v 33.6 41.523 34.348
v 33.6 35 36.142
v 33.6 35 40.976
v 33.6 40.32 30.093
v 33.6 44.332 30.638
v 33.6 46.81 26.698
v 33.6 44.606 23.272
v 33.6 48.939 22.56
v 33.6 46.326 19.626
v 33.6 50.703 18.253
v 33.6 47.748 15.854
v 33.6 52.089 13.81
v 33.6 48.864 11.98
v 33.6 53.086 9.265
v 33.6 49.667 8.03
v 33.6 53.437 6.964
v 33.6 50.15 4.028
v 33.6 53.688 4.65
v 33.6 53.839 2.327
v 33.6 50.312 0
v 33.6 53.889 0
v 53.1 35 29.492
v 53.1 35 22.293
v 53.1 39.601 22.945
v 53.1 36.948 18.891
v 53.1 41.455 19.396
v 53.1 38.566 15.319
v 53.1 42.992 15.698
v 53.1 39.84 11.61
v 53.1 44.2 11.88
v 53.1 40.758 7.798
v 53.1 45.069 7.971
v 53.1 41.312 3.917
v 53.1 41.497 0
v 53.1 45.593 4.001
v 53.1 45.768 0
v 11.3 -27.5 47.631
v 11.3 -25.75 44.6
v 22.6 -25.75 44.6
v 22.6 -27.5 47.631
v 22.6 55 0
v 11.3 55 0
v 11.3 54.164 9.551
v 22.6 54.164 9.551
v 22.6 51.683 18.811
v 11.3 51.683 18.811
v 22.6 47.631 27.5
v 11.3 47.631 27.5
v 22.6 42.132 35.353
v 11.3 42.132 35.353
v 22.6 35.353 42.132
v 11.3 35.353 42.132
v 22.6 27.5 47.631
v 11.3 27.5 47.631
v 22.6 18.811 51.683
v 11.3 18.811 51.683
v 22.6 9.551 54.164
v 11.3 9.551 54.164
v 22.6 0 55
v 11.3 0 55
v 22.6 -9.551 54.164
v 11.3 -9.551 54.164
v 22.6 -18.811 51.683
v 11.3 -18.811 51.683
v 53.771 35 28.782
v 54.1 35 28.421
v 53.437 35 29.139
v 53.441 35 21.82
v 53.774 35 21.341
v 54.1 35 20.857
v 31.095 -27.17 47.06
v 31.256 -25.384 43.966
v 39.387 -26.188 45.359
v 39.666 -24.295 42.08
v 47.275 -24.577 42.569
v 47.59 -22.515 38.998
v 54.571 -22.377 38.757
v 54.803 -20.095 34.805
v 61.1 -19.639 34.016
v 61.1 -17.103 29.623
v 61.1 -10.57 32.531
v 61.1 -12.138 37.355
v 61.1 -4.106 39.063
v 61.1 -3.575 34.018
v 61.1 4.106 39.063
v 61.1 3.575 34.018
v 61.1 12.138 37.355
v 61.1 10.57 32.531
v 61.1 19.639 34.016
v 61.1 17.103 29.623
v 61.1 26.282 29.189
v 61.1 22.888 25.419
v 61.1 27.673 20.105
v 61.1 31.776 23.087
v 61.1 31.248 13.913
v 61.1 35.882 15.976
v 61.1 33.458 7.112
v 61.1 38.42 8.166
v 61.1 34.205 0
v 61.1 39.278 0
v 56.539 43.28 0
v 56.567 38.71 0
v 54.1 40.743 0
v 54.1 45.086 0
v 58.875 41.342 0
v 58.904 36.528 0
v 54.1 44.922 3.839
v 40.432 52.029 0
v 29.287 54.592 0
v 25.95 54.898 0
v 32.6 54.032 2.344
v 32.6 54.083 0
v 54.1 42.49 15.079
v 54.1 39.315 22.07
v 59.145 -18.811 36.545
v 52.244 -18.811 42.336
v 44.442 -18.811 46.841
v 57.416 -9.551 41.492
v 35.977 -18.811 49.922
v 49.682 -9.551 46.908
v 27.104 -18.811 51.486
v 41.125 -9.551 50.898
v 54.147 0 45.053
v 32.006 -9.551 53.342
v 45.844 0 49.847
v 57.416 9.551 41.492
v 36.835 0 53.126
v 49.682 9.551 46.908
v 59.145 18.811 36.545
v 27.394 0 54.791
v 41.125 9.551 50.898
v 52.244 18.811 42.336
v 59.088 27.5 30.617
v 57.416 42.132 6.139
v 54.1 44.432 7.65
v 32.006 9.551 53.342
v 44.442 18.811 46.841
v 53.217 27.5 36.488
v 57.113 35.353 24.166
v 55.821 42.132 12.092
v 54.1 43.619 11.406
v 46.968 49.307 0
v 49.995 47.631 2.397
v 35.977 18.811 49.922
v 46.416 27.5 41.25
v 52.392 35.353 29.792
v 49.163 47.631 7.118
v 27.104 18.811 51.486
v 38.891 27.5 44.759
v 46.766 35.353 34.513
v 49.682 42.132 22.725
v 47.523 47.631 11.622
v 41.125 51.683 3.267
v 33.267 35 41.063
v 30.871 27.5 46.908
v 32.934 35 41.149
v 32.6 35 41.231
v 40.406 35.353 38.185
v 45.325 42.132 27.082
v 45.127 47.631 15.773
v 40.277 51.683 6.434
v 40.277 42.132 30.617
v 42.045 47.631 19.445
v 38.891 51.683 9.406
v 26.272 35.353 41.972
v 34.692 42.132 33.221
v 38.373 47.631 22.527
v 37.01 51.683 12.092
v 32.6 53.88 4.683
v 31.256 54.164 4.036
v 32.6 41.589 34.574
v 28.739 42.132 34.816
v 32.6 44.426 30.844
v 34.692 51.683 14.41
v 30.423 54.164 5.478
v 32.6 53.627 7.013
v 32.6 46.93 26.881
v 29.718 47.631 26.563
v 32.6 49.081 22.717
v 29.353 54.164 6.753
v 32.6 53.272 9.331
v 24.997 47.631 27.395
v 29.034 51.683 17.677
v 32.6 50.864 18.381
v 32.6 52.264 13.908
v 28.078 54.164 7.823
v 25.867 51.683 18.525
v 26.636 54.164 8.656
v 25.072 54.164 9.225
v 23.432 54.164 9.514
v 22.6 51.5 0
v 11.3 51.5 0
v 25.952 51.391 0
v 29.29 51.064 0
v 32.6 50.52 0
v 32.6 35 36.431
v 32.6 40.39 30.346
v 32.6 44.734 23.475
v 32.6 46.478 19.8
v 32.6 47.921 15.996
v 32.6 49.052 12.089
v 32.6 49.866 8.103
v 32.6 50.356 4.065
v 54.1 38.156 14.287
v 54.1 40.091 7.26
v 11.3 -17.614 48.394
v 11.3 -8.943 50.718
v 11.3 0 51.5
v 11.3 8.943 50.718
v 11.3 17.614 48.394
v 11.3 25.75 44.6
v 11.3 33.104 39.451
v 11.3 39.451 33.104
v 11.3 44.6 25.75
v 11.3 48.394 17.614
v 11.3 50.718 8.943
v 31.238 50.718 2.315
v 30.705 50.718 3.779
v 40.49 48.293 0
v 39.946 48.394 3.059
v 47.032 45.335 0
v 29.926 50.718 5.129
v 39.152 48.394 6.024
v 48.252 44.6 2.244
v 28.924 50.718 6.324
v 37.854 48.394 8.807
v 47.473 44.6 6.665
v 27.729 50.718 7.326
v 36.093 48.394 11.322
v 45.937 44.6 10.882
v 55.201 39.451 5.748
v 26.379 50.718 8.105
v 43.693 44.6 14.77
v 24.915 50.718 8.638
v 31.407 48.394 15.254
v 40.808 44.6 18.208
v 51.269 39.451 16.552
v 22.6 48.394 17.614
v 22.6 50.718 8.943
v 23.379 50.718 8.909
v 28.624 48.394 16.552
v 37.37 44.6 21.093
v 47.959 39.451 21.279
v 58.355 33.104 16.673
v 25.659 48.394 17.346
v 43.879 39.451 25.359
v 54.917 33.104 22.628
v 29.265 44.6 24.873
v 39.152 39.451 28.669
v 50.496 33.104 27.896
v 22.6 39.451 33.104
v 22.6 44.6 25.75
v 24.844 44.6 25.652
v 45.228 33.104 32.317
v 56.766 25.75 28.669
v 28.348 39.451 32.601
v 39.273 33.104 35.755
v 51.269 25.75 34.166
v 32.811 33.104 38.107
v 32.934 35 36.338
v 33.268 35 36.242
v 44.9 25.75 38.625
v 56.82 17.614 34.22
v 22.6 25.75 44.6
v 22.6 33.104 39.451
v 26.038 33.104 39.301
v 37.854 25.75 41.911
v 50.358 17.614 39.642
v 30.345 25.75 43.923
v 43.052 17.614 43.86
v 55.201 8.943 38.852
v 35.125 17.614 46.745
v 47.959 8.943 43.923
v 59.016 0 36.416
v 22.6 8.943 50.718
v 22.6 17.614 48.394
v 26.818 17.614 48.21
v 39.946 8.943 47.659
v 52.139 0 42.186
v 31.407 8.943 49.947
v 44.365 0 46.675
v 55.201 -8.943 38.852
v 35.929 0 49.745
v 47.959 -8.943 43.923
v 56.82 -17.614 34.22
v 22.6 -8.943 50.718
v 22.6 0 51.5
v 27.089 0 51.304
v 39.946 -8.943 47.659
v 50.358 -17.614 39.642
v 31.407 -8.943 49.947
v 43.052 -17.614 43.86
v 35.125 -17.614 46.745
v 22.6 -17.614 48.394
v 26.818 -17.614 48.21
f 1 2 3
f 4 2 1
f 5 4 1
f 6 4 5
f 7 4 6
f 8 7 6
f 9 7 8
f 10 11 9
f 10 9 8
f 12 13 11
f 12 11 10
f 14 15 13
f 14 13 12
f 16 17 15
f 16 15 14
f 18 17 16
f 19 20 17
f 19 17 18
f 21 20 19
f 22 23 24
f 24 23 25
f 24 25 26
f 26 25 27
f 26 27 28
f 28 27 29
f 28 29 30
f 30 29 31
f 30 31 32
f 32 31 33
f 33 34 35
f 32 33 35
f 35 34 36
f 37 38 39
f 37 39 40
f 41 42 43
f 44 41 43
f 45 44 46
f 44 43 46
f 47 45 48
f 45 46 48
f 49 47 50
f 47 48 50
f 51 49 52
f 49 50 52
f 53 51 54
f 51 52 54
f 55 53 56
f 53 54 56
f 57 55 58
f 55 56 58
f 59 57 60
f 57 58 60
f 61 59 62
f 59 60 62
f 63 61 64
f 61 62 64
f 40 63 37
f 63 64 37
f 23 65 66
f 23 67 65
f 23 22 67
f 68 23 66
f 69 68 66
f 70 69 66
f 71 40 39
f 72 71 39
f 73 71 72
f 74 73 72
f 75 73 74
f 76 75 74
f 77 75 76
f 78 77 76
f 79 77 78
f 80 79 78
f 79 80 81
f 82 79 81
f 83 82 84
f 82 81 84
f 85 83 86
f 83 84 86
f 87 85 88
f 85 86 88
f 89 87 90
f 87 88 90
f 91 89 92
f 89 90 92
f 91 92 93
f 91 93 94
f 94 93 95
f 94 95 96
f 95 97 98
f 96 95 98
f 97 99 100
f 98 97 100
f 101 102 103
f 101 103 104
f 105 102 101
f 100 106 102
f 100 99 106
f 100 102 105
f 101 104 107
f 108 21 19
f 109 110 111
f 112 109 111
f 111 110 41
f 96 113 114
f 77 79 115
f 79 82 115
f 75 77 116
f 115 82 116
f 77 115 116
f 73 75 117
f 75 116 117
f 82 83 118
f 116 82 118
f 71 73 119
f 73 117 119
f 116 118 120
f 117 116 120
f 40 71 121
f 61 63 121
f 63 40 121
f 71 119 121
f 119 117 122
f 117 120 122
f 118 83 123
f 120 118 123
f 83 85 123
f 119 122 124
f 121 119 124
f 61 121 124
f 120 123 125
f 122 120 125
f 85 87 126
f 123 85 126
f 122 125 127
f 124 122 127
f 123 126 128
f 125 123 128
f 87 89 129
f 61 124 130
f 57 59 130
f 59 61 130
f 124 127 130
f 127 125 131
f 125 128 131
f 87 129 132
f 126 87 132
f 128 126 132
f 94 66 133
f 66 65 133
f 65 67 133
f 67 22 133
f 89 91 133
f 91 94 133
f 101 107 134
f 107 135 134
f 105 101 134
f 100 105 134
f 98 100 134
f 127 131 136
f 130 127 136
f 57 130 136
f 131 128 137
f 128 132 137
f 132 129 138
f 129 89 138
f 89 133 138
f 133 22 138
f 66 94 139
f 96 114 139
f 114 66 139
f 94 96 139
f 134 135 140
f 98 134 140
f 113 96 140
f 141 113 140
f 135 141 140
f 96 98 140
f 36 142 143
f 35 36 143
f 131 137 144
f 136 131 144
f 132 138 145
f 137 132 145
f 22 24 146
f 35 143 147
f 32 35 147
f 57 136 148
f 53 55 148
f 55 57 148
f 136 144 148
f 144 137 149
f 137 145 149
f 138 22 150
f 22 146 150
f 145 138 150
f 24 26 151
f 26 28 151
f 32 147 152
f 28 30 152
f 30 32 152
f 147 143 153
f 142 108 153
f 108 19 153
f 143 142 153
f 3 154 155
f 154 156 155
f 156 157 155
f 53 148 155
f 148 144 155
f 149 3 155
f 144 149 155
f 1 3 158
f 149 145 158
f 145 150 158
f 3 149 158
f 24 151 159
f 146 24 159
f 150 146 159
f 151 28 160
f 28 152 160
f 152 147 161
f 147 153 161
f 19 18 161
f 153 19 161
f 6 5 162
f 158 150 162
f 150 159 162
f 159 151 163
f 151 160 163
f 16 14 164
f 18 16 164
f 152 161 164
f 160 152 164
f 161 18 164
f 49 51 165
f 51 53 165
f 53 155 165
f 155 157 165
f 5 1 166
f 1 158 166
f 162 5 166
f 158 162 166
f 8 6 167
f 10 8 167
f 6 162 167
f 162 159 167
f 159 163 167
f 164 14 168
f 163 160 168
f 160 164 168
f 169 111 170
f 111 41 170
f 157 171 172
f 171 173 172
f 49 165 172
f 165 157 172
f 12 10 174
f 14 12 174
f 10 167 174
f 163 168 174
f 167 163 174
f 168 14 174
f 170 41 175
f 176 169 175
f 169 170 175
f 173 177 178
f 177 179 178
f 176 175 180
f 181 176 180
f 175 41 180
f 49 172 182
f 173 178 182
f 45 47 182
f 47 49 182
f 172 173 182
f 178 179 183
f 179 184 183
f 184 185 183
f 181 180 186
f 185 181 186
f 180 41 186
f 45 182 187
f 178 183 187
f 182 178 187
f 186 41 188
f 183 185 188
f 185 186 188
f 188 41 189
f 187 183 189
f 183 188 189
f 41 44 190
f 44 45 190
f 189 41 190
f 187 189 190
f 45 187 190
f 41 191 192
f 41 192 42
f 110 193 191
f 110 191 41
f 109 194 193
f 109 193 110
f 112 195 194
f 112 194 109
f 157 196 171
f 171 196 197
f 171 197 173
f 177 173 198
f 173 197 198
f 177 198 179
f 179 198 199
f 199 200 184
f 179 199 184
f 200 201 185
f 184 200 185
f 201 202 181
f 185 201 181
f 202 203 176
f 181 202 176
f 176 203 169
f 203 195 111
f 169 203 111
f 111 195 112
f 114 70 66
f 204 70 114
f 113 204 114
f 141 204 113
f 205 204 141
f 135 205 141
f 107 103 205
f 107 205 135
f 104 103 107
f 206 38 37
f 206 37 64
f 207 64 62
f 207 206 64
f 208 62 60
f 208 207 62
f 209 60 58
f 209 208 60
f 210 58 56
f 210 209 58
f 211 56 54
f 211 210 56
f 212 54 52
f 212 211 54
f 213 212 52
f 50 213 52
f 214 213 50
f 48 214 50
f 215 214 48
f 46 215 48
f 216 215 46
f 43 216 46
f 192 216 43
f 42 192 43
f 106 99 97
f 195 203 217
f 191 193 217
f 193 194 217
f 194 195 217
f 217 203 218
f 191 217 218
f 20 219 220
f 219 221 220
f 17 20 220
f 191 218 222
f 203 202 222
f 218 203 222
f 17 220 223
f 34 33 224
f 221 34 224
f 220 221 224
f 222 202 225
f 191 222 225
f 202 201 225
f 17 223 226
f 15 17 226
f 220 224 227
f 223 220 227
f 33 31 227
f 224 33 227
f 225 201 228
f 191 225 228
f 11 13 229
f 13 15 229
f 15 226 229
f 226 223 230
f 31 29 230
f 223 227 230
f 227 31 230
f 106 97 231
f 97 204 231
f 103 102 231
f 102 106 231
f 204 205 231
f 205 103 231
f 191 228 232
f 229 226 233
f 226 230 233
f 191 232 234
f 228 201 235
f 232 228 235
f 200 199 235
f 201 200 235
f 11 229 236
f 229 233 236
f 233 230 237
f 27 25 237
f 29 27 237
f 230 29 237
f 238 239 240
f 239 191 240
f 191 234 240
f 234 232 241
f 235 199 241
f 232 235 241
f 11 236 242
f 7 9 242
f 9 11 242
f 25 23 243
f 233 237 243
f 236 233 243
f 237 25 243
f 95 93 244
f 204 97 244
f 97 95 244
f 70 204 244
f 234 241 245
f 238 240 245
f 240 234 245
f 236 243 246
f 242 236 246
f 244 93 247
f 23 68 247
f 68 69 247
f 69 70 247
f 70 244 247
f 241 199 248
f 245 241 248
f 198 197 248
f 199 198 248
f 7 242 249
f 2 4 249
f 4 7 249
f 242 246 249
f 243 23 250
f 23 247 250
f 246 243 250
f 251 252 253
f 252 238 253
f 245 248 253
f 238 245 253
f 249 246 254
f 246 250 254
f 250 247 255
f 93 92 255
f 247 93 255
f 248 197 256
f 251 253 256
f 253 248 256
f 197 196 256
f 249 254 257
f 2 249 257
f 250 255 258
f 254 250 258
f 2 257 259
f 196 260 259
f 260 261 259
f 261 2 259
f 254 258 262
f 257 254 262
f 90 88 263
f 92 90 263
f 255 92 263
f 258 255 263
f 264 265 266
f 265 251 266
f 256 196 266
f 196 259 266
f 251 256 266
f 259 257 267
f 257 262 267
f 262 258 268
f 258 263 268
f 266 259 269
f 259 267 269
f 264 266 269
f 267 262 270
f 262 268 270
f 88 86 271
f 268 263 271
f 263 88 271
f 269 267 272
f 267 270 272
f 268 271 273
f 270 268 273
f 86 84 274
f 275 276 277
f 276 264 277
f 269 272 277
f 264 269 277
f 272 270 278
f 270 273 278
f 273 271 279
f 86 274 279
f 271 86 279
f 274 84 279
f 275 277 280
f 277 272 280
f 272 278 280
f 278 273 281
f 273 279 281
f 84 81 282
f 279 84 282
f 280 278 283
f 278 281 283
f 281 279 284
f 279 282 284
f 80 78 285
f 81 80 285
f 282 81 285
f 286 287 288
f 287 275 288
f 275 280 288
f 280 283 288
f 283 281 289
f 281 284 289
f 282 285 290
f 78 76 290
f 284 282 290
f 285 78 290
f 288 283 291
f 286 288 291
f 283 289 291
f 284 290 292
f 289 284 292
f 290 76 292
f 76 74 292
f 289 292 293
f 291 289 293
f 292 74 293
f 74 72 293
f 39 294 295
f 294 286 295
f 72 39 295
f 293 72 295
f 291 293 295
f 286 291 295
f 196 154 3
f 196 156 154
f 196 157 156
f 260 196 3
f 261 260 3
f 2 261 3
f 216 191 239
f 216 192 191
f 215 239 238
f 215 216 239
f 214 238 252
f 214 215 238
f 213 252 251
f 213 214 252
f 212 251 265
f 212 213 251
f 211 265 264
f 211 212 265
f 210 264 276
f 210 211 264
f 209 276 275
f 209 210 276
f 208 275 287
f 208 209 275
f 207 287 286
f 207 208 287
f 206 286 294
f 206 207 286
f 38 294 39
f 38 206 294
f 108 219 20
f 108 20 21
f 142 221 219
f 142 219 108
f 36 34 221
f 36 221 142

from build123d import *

# Parameters (mm, degrees)
CUT_EXTRUDE_1_DEPTH      = 96.262794416
CUT_EXTRUDE_1_DEPTH_BACK = 96.262794416
SKETCH_2_W               = 55
SKETCH_2_H               = 110
CUT_EXTRUDE_2_DEPTH      = 96.262794416
CUT_EXTRUDE_2_DEPTH_BACK = 96.262794416
SKETCH_3_W               = 23.273135213
SKETCH_3_H               = 110
CUT_EXTRUDE_3_DEPTH      = 87.788536109
SKETCH_5_W               = 1
SKETCH_5_H               = 20
CUT_EXTRUDE_4_DEPTH      = 87.788536109
SKETCH_6_W               = 11.3
SKETCH_6_H               = 3.5
CUT_EXTRUDE_START        = -10
CUT_EXTRUDE_5_DEPTH      = 10
CUT_EXTRUDE_7_DEPTH      = 99.910110707
CUT_EXTRUDE_8_DEPTH      = 70
CUT_EXTRUDE_8_DEPTH_BACK = 70
CUT_EXTRUDE_9_DEPTH      = 70


with BuildPart() as part:
    # 草图1 → 旋转8 (revolve)
    with BuildSketch(Plane.XY):
        with BuildLine():
            Line((0, 55), (0, 51.5))
            ThreePointArc((0, 51.5), (-51.5, 0), (0, -51.5))
            Line((0, -51.5), (0, -55))
            ThreePointArc((0, -55), (-55, 0), (0, 55))
        make_face()
    revolve(axis=Axis((0, 0, 0), (0, 1, 0)))

    # 草图2 → 切除-拉伸1 (cut, two sides: drawn at the far end of the back side and taken through both)
    with BuildSketch(Plane.XY.offset(-CUT_EXTRUDE_1_DEPTH_BACK)):
        with Locations((27.5, 0)):
            Rectangle(SKETCH_2_W, SKETCH_2_H)
    extrude(amount=CUT_EXTRUDE_1_DEPTH + CUT_EXTRUDE_1_DEPTH_BACK, mode=Mode.SUBTRACT)

    # 草图3 → 切除-拉伸2 (cut, two sides: drawn at the far end of the back side and taken through both)
    with BuildSketch(Plane.XY.offset(-CUT_EXTRUDE_2_DEPTH_BACK)):
        with Locations((-50.136567607, 0)):
            Rectangle(SKETCH_3_W, SKETCH_3_H)
    extrude(amount=CUT_EXTRUDE_2_DEPTH + CUT_EXTRUDE_2_DEPTH_BACK, mode=Mode.SUBTRACT)

    # 草图4 → 切除-拉伸3 (cut, through all)
    with BuildSketch(Plane.ZY.offset(38.5)):
        with BuildLine():
            Line((0, 0), (0, 64.529887393))
            ThreePointArc((0, 64.529887393), (-55.884521786, -32.264943697), (55.884521786, -32.264943697))
            Line((55.884521786, -32.264943697), (0, 0))
        make_face()
    extrude(amount=-CUT_EXTRUDE_3_DEPTH, mode=Mode.SUBTRACT)

    # 草图5 → 切除-拉伸4 (cut, through all)
    with BuildSketch(Plane(origin=(0, 0, 0), x_dir=(-1, 0, 0), z_dir=(0, 0, -1))):
        with Locations((31, 45)):
            Rectangle(SKETCH_5_W, SKETCH_5_H)
        with Locations((10.5, 45)):
            Rectangle(SKETCH_5_W, SKETCH_5_H)
    extrude(amount=-CUT_EXTRUDE_4_DEPTH, mode=Mode.SUBTRACT)

    # 草图6 → 旋转9 (revolve)
    with BuildSketch(Plane.XY):
        with Locations((5.65, 53.25)):
            Rectangle(SKETCH_6_W, SKETCH_6_H)
    revolve(axis=Axis((0, 0, 0), (1, 0, 0)))

    # 草图7 → 切除-拉伸5 (cut)
    with BuildSketch(Plane.ZY.offset(CUT_EXTRUDE_START)):
        with BuildLine():
            Line((0, 55), (0, 0))
            Line((0, 0), (47.631397208, -27.5))
            ThreePointArc((47.631397208, -27.5), (-47.631397208, -27.5), (0, 55))
        make_face()
    extrude(amount=CUT_EXTRUDE_5_DEPTH, mode=Mode.SUBTRACT)

    # 镜向1: part across plane


with BuildPart() as part_1:
    add(part.part)
    add(part.part.mirror(Plane(origin=(11.3, 55, 0), x_dir=(0, 0, 1), z_dir=(-1, 0, 0))))

    # 草图8 → 切除-拉伸7 (cut, through all)
    with BuildSketch(Plane.XY):
        Polygon((-38.5, 54.805759265), (-38.5, -31.439264279), (11.3, -31.439264279), (11.3, 56.704937245), align=None)
    extrude(amount=CUT_EXTRUDE_7_DEPTH, mode=Mode.SUBTRACT)

    # 草图9 → 切除-拉伸8 (cut, two sides: drawn at the far end of the back side and taken through both)
    with BuildSketch(Plane.XY.offset(-CUT_EXTRUDE_8_DEPTH_BACK)):
        Polygon((11.3, 55), (11.3, 58.911756152), (4.567331784, 58.911756152), (4.567331784, -60.848172915), (11.3, -60.848172915), align=None)
    extrude(amount=CUT_EXTRUDE_8_DEPTH + CUT_EXTRUDE_8_DEPTH_BACK, mode=Mode.SUBTRACT)

    # 草图10 → 切除-拉伸9 (cut)
    with BuildSketch(Plane(origin=(12.6, 0, 0), x_dir=(0, 0, -1), z_dir=(1, 0, 0))):
        with BuildLine():
            Line((0, 55), (0, 0))
            Line((0, 0), (-47.631397208, -27.5))
            ThreePointArc((-47.631397208, -27.5), (47.631397208, -27.5), (0, 55))
        make_face()
    extrude(amount=-CUT_EXTRUDE_9_DEPTH, mode=Mode.SUBTRACT)


solid = part_1.part
